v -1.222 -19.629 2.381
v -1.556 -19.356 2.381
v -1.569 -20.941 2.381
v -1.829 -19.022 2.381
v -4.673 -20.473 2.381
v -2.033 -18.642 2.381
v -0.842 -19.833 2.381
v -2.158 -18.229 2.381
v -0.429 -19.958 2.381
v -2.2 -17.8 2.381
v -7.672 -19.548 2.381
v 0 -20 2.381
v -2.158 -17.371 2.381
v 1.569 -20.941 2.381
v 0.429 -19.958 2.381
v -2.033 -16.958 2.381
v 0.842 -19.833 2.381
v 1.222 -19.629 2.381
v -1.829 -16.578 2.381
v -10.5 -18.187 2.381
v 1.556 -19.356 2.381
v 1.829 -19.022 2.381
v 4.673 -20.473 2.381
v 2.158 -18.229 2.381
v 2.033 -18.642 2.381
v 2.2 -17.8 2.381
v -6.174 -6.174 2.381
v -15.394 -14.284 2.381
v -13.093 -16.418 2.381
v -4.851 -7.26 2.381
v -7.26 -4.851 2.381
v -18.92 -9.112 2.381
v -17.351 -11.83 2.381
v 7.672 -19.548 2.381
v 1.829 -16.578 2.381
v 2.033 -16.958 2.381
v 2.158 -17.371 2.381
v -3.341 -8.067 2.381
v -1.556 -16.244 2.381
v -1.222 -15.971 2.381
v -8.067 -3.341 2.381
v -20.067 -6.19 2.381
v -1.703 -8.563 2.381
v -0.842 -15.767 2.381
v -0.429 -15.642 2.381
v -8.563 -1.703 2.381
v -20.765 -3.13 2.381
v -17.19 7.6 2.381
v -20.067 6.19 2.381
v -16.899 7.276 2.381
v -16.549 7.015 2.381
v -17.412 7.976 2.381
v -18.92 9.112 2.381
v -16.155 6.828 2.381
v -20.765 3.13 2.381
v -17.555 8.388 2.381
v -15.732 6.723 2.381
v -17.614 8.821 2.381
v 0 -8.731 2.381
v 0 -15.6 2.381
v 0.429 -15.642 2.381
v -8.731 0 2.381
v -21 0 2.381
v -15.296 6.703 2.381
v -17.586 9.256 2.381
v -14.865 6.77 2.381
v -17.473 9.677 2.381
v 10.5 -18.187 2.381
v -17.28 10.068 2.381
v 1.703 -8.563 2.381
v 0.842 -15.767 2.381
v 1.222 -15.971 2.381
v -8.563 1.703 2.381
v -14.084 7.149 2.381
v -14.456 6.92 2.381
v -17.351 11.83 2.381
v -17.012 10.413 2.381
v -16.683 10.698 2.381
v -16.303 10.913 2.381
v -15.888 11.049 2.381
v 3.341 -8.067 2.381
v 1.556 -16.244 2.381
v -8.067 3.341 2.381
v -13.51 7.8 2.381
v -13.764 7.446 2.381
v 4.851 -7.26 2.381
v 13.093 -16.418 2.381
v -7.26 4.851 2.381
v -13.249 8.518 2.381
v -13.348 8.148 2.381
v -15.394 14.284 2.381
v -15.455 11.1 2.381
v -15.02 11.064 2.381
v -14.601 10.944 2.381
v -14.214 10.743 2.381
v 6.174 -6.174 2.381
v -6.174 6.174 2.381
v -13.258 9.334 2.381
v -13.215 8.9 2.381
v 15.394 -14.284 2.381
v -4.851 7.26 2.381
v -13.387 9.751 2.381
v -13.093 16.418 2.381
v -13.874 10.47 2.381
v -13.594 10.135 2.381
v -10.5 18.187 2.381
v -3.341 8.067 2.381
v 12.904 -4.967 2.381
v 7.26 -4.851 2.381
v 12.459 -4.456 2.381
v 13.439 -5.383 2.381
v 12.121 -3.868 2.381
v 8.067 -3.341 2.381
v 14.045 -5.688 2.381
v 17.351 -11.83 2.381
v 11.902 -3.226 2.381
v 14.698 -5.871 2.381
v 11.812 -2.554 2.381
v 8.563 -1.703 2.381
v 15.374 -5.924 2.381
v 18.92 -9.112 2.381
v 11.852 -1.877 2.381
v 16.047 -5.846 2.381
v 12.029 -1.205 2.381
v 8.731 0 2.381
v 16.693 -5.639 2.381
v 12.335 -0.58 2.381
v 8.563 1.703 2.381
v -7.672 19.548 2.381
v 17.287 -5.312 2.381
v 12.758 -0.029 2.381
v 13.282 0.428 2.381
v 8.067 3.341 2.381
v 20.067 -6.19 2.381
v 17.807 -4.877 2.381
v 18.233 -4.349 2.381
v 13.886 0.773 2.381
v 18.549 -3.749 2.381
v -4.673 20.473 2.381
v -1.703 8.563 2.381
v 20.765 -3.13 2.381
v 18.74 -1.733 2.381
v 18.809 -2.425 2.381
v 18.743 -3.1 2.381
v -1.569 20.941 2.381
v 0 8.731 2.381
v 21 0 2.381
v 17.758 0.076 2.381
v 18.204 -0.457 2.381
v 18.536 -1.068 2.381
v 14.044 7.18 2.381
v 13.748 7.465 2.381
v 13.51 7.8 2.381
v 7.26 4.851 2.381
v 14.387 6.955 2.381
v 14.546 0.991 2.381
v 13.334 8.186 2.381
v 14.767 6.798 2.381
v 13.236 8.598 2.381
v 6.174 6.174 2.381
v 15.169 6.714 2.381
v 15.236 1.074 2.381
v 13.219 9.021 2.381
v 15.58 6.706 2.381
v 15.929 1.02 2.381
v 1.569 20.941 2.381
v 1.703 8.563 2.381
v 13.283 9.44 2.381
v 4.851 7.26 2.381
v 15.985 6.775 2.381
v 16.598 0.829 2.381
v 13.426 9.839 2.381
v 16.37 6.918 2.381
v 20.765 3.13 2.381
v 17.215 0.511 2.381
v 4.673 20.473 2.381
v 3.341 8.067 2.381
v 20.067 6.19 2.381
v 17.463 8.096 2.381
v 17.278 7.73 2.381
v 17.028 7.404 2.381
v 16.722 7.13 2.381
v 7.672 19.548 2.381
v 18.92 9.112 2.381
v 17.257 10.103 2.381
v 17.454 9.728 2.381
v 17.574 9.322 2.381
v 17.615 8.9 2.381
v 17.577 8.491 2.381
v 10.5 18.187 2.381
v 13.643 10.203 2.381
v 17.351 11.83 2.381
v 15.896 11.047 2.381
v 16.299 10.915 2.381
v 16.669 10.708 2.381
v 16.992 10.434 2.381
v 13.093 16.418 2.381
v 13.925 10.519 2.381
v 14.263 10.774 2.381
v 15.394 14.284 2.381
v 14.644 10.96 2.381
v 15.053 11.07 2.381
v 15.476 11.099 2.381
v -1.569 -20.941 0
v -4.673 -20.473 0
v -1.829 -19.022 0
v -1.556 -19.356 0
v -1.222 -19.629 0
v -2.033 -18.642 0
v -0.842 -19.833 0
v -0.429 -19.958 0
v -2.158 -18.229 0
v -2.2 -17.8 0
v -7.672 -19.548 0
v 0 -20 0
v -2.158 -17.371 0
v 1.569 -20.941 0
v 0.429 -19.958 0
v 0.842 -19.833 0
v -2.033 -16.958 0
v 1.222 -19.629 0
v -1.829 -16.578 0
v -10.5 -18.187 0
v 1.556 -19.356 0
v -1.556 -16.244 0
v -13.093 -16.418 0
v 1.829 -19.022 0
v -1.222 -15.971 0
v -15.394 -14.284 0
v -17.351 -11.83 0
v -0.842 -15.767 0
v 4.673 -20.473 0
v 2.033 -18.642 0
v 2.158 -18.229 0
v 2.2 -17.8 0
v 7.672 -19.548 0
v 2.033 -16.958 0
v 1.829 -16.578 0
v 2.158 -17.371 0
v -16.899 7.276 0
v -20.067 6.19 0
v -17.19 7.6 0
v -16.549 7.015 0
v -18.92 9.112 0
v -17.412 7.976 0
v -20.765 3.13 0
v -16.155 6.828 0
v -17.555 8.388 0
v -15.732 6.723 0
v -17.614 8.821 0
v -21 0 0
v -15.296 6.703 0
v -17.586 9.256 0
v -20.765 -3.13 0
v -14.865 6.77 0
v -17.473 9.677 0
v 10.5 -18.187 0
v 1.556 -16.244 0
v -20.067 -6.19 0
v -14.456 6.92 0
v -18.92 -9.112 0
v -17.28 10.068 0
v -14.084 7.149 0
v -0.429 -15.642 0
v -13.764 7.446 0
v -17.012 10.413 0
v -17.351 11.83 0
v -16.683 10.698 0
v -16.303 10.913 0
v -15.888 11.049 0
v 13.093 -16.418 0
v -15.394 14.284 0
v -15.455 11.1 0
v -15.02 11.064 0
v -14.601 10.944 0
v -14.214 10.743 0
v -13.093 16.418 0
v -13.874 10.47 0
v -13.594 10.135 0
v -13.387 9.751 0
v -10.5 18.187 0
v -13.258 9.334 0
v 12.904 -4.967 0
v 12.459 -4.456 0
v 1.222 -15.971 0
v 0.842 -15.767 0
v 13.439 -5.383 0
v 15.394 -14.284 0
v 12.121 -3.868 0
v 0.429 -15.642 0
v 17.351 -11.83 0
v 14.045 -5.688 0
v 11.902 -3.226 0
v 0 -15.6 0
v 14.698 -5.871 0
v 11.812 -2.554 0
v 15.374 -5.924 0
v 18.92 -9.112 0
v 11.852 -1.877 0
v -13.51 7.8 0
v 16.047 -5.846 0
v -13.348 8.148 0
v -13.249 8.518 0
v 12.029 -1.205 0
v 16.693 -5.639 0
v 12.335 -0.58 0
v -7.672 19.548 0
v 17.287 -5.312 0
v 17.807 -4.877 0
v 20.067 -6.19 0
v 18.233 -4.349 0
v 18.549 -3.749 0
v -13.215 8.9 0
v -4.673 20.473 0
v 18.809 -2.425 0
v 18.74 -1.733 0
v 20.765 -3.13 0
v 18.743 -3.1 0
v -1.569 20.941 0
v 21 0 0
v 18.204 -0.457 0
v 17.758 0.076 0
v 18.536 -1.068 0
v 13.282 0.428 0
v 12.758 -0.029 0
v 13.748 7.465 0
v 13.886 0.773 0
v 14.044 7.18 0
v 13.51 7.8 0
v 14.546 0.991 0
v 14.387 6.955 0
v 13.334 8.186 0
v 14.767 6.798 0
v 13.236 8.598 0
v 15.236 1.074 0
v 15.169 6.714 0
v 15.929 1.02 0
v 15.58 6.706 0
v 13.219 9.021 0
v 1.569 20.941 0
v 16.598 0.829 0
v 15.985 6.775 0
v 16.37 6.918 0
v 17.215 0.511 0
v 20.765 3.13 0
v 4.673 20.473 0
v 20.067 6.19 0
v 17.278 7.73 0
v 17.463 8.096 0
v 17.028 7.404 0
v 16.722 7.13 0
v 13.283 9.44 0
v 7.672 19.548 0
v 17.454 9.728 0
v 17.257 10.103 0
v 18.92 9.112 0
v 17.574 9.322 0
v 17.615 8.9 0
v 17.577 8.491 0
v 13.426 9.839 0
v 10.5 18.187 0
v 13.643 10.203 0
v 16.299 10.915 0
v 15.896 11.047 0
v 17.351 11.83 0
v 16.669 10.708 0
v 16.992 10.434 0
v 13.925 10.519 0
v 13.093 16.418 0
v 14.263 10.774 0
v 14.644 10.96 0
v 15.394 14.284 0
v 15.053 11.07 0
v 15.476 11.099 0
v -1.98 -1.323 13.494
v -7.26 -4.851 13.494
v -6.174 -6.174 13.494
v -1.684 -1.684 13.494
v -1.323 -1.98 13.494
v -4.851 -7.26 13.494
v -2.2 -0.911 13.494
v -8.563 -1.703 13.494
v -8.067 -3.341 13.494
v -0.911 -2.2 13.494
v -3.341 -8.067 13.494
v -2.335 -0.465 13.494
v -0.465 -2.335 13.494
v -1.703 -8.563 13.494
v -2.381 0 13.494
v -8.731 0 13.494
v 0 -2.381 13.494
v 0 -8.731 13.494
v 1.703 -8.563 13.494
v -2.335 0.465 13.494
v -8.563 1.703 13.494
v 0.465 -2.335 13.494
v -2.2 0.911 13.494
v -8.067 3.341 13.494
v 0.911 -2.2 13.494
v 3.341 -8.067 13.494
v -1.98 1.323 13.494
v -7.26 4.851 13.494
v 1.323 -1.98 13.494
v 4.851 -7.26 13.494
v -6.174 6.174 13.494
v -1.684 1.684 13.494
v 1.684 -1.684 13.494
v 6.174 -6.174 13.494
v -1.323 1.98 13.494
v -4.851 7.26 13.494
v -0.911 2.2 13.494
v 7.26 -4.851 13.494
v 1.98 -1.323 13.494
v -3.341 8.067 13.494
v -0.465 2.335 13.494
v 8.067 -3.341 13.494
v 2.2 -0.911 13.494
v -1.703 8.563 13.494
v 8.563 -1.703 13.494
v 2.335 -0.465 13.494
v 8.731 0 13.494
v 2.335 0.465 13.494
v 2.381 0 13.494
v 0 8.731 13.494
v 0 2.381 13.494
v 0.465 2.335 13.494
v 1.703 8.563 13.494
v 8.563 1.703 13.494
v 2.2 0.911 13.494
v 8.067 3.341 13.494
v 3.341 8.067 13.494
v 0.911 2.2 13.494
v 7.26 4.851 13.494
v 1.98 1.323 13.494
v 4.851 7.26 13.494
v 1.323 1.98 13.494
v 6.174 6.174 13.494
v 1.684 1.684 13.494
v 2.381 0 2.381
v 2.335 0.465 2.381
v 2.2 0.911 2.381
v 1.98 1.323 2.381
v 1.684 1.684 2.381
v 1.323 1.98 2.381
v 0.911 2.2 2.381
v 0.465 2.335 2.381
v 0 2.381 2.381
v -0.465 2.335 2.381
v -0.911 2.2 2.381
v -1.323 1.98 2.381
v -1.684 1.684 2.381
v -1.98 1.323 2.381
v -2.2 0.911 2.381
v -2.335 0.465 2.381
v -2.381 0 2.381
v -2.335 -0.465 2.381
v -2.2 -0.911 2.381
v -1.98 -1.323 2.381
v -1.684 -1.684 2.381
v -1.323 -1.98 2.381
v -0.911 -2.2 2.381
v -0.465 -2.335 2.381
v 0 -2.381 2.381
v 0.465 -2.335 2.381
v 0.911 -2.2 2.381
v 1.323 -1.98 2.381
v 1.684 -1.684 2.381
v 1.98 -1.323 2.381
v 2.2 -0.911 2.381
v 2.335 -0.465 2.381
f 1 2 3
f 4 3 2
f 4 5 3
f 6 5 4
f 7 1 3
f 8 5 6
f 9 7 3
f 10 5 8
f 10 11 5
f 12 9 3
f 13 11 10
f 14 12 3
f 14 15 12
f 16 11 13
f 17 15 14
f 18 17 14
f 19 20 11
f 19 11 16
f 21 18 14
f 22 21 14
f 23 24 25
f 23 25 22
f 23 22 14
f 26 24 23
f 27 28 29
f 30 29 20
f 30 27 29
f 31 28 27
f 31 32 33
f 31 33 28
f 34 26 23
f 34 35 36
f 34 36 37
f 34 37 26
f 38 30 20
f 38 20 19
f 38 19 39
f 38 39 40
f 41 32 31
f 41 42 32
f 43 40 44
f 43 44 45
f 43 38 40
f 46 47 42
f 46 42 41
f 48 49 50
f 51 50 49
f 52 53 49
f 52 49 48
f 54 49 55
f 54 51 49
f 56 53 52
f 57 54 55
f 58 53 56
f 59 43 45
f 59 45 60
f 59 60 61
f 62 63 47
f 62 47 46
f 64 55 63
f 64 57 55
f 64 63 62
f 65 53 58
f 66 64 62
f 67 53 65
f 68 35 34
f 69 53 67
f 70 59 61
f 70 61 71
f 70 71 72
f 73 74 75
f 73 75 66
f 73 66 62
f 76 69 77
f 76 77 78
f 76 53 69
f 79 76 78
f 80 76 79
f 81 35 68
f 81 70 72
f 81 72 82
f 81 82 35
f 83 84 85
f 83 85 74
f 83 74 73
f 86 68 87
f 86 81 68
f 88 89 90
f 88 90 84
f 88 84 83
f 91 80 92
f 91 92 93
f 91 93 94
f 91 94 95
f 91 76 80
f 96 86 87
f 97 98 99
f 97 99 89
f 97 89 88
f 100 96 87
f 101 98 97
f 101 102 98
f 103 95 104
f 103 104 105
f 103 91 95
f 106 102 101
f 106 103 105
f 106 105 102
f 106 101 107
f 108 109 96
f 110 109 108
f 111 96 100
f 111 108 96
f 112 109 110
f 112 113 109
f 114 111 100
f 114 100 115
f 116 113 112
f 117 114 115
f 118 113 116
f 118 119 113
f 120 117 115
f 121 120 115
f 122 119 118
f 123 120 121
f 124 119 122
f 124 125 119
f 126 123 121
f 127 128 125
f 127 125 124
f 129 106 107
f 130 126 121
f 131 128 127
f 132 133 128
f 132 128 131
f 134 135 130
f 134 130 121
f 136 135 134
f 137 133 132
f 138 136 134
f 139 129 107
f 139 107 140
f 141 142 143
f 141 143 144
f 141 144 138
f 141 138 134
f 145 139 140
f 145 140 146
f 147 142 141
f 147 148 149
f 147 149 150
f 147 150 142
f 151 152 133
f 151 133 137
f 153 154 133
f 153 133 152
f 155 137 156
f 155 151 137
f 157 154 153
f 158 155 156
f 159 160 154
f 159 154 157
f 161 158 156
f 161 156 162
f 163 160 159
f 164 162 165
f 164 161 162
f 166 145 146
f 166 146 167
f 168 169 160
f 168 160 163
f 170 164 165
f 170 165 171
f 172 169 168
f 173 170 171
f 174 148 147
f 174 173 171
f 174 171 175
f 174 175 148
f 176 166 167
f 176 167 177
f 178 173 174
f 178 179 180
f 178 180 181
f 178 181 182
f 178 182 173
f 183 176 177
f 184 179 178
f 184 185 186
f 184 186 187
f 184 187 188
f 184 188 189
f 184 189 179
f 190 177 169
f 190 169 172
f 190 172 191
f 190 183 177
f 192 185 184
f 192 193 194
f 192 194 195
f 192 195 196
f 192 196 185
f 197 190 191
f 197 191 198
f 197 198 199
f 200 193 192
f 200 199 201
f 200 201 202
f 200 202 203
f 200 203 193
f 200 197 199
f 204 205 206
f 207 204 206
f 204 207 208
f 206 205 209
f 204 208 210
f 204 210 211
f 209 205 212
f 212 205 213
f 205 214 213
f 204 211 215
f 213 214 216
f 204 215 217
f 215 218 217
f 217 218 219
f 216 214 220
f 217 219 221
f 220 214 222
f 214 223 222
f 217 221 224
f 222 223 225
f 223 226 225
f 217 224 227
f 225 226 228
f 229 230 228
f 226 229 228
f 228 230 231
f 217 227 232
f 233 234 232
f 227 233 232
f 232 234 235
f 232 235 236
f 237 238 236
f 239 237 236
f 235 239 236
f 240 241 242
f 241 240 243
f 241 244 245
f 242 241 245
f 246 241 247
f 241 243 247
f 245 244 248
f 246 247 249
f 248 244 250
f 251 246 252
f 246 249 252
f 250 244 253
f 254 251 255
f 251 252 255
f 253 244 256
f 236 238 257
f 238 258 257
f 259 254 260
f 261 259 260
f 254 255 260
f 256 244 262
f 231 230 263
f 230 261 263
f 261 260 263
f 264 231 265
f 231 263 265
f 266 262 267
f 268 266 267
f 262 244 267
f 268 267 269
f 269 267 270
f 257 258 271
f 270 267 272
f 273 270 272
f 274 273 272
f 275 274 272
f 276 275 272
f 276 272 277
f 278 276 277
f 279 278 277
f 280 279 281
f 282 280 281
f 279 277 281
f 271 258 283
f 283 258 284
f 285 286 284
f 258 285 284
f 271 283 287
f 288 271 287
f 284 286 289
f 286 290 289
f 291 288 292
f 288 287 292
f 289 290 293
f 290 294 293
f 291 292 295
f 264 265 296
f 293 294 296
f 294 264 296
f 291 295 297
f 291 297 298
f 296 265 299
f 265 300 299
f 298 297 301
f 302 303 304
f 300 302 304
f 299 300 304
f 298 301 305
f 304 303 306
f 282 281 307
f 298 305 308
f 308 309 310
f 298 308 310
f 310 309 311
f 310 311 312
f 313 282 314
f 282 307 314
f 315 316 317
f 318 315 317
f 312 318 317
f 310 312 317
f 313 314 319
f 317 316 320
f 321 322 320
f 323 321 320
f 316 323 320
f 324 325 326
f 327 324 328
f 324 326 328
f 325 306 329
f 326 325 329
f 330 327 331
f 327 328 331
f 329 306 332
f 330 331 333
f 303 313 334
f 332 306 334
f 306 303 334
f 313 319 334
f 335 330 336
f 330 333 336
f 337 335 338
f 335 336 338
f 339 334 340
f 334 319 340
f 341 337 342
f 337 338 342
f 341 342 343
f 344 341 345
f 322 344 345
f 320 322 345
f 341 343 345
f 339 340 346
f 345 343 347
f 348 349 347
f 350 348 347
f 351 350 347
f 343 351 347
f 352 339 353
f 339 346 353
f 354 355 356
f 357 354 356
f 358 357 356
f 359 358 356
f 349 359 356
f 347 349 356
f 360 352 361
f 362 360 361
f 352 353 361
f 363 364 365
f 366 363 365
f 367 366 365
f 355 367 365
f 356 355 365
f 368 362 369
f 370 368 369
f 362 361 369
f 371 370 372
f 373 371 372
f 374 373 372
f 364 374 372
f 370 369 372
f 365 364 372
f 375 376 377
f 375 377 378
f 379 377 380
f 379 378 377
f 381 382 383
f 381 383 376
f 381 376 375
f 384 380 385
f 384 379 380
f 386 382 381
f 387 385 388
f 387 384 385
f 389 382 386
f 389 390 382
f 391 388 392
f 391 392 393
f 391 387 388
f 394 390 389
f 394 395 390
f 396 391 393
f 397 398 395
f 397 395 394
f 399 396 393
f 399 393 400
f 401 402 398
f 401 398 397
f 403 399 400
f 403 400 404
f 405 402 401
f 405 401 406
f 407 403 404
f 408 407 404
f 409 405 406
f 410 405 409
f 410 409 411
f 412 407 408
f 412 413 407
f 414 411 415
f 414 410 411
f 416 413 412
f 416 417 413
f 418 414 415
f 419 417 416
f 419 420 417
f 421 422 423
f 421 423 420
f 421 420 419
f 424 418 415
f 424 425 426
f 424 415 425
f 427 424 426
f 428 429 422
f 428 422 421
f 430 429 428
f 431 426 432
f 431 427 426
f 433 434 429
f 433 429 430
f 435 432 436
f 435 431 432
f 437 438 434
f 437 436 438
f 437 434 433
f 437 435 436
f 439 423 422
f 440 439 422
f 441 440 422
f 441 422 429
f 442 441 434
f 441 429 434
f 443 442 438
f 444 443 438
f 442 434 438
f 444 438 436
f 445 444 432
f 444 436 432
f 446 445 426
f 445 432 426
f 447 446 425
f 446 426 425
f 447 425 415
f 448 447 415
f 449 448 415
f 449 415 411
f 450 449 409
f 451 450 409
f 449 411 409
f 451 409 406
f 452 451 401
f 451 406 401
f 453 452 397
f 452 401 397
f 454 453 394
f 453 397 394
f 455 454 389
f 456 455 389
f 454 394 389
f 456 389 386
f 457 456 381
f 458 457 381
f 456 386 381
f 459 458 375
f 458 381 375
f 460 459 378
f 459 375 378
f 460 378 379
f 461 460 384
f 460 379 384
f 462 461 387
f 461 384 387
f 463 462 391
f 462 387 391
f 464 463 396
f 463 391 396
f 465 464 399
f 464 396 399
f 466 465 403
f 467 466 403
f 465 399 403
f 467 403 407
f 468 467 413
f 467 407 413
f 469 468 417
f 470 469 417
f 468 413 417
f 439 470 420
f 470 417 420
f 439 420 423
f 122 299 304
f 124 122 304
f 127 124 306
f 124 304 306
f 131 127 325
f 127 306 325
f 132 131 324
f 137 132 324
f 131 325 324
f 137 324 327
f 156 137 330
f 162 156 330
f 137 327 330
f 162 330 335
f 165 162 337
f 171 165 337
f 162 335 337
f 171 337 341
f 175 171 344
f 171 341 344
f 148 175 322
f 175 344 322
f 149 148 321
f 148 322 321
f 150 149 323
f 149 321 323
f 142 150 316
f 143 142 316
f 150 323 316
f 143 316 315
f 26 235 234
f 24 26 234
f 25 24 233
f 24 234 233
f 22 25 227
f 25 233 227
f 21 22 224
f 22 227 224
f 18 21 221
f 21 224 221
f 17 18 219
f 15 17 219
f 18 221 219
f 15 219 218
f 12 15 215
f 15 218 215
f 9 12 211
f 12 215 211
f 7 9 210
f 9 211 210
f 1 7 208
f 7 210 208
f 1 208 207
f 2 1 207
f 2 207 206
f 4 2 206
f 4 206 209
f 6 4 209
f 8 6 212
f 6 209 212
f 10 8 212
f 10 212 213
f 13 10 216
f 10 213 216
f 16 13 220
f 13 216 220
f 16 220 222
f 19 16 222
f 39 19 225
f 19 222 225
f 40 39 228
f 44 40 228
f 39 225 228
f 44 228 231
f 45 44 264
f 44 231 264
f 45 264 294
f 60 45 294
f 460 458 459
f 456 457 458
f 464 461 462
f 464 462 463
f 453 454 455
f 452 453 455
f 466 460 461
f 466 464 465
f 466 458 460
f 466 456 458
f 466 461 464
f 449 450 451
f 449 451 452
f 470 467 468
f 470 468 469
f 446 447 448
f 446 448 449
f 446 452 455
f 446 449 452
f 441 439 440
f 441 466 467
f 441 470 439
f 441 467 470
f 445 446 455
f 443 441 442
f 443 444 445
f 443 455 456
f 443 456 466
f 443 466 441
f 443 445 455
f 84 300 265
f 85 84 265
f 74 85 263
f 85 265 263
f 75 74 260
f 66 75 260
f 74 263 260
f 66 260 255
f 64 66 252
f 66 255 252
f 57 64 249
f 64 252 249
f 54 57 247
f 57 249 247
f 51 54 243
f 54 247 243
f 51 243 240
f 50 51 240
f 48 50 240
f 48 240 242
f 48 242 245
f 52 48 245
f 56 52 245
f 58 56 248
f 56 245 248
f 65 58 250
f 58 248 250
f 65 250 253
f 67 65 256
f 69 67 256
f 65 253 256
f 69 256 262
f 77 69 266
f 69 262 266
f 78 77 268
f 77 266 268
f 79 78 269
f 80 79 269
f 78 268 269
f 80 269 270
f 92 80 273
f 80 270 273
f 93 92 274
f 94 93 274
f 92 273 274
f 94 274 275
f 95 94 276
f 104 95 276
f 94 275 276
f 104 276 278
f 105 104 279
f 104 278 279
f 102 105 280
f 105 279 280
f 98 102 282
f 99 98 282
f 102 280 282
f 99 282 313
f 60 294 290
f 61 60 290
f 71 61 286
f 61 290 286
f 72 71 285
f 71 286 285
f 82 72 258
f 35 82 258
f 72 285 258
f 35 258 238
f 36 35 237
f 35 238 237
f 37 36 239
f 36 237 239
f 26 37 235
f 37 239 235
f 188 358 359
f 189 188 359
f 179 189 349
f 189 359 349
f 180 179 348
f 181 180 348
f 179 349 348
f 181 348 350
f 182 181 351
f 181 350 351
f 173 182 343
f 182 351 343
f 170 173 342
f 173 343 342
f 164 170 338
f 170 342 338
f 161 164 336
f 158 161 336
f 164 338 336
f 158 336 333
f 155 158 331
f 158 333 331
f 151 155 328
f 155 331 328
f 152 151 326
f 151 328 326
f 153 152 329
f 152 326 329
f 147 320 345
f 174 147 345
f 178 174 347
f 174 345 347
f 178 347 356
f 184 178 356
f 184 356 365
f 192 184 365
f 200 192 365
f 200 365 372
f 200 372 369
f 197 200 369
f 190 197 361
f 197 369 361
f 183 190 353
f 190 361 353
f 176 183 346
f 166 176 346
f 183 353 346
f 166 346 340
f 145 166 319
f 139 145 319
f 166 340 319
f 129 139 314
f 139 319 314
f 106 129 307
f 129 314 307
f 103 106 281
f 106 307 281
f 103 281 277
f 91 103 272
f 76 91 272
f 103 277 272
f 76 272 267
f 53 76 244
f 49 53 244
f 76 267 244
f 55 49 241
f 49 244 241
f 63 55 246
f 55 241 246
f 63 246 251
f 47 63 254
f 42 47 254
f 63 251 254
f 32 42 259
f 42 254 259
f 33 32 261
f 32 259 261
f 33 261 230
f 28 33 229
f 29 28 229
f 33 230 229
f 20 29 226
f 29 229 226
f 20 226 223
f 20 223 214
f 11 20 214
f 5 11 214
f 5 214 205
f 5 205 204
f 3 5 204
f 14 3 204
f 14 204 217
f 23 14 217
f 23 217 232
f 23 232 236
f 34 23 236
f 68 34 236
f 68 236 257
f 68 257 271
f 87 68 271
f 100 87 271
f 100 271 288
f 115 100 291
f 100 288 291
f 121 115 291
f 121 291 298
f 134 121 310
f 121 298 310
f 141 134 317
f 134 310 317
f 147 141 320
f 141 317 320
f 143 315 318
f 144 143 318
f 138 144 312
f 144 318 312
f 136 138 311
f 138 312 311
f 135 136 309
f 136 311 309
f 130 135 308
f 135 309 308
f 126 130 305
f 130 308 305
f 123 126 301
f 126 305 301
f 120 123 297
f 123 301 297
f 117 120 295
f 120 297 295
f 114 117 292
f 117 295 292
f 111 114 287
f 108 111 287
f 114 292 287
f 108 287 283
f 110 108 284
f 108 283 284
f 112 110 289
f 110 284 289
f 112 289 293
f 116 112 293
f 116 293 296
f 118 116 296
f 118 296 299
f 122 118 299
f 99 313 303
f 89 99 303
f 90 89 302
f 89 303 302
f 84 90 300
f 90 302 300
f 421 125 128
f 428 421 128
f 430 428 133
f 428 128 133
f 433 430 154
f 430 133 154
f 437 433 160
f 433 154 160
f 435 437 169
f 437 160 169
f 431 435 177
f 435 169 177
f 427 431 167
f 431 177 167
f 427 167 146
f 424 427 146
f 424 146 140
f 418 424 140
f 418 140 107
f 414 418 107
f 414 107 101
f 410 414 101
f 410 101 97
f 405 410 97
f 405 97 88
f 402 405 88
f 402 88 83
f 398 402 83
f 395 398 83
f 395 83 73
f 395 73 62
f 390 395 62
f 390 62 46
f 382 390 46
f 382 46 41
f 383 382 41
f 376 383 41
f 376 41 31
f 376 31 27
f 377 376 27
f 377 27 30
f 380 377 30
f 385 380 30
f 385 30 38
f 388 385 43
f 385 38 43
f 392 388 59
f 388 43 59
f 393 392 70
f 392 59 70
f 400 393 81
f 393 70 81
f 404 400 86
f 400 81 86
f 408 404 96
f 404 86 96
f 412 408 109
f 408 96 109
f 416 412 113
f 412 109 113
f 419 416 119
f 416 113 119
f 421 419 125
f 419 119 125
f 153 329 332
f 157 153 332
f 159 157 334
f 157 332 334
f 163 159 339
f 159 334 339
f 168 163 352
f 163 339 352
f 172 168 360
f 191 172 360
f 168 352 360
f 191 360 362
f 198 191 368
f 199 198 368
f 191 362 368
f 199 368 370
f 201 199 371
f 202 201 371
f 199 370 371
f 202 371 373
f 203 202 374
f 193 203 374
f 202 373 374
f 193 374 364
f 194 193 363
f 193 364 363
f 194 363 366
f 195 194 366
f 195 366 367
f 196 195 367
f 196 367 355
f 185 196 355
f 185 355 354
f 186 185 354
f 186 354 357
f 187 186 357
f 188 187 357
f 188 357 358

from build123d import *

# Parameters (mm, degrees)
F0_R     = 21
F2_DEPTH = 2.38125
F1_R     = 8.73125
F3_DEPTH = 13.49375
F4_R     = 2.38125
F5_DEPTH = 11.1125
F7_DEPTH = 2.38125
F8_DEPTH = 2.38125


with BuildPart() as f2:
    # F0 (on Top) → F2 (new body)
    with BuildSketch(Plane.XY):
        Circle(F0_R)
    extrude(amount=F2_DEPTH)

    # F1 (on face) → F3 (join)
    with BuildSketch(Plane.XY):
        Circle(F1_R)
    extrude(amount=F3_DEPTH)

    # F4 (on face) → F5 (cut)
    with BuildSketch(Plane.XY.offset(13.49375)):
        Circle(F4_R)
    extrude(amount=-F5_DEPTH, mode=Mode.SUBTRACT)

    # F6 (on face) → F7 (cut)
    with BuildSketch(Plane(origin=(0, 0, 0), x_dir=(1, 0, 0), z_dir=(0, 0, -1))):
        with BuildLine():
            ThreePointArc((0, 15.6), (1.555635, 16.244365), (2.2, 17.8))
            ThreePointArc((2.2, 17.8), (-1.555635, 19.355635), (0, 15.6))
        make_face()
    extrude(amount=-F7_DEPTH, mode=Mode.SUBTRACT)

    # F6 (on face) → F8 (cut)
    with BuildSketch(Plane(origin=(0, 0, 0), x_dir=(1, 0, 0), z_dir=(0, 0, -1))):
        with BuildLine():
            ThreePointArc((0, 15.6), (1.555635, 16.244365), (2.2, 17.8))
            ThreePointArc((2.2, 17.8), (-1.555635, 19.355635), (0, 15.6))
        make_face()
        with BuildLine():
            ThreePointArc((18.809169, 2.424734), (15.034562, 5.913945), (11.85226, 1.877214))
            ThreePointArc((11.85226, 1.877214), (15.583776, -1.064476), (18.809169, 2.424734))
        make_face()
        with BuildLine():
            ThreePointArc((17.615252, -8.9), (15.984654, -6.774963), (13.509996, -7.8))
            ThreePointArc((13.509996, -7.8), (14.84585, -11.025037), (17.615252, -8.9))
        make_face()
        with BuildLine():
            ThreePointArc((-13.215252, -8.9), (-13.290215, -8.330598), (-13.509996, -7.8))
            ThreePointArc((-13.509996, -7.8), (-17.540289, -9.469402), (-13.215252, -8.9))
        make_face()
    extrude(amount=-F8_DEPTH, mode=Mode.SUBTRACT)


solid = f2.part
